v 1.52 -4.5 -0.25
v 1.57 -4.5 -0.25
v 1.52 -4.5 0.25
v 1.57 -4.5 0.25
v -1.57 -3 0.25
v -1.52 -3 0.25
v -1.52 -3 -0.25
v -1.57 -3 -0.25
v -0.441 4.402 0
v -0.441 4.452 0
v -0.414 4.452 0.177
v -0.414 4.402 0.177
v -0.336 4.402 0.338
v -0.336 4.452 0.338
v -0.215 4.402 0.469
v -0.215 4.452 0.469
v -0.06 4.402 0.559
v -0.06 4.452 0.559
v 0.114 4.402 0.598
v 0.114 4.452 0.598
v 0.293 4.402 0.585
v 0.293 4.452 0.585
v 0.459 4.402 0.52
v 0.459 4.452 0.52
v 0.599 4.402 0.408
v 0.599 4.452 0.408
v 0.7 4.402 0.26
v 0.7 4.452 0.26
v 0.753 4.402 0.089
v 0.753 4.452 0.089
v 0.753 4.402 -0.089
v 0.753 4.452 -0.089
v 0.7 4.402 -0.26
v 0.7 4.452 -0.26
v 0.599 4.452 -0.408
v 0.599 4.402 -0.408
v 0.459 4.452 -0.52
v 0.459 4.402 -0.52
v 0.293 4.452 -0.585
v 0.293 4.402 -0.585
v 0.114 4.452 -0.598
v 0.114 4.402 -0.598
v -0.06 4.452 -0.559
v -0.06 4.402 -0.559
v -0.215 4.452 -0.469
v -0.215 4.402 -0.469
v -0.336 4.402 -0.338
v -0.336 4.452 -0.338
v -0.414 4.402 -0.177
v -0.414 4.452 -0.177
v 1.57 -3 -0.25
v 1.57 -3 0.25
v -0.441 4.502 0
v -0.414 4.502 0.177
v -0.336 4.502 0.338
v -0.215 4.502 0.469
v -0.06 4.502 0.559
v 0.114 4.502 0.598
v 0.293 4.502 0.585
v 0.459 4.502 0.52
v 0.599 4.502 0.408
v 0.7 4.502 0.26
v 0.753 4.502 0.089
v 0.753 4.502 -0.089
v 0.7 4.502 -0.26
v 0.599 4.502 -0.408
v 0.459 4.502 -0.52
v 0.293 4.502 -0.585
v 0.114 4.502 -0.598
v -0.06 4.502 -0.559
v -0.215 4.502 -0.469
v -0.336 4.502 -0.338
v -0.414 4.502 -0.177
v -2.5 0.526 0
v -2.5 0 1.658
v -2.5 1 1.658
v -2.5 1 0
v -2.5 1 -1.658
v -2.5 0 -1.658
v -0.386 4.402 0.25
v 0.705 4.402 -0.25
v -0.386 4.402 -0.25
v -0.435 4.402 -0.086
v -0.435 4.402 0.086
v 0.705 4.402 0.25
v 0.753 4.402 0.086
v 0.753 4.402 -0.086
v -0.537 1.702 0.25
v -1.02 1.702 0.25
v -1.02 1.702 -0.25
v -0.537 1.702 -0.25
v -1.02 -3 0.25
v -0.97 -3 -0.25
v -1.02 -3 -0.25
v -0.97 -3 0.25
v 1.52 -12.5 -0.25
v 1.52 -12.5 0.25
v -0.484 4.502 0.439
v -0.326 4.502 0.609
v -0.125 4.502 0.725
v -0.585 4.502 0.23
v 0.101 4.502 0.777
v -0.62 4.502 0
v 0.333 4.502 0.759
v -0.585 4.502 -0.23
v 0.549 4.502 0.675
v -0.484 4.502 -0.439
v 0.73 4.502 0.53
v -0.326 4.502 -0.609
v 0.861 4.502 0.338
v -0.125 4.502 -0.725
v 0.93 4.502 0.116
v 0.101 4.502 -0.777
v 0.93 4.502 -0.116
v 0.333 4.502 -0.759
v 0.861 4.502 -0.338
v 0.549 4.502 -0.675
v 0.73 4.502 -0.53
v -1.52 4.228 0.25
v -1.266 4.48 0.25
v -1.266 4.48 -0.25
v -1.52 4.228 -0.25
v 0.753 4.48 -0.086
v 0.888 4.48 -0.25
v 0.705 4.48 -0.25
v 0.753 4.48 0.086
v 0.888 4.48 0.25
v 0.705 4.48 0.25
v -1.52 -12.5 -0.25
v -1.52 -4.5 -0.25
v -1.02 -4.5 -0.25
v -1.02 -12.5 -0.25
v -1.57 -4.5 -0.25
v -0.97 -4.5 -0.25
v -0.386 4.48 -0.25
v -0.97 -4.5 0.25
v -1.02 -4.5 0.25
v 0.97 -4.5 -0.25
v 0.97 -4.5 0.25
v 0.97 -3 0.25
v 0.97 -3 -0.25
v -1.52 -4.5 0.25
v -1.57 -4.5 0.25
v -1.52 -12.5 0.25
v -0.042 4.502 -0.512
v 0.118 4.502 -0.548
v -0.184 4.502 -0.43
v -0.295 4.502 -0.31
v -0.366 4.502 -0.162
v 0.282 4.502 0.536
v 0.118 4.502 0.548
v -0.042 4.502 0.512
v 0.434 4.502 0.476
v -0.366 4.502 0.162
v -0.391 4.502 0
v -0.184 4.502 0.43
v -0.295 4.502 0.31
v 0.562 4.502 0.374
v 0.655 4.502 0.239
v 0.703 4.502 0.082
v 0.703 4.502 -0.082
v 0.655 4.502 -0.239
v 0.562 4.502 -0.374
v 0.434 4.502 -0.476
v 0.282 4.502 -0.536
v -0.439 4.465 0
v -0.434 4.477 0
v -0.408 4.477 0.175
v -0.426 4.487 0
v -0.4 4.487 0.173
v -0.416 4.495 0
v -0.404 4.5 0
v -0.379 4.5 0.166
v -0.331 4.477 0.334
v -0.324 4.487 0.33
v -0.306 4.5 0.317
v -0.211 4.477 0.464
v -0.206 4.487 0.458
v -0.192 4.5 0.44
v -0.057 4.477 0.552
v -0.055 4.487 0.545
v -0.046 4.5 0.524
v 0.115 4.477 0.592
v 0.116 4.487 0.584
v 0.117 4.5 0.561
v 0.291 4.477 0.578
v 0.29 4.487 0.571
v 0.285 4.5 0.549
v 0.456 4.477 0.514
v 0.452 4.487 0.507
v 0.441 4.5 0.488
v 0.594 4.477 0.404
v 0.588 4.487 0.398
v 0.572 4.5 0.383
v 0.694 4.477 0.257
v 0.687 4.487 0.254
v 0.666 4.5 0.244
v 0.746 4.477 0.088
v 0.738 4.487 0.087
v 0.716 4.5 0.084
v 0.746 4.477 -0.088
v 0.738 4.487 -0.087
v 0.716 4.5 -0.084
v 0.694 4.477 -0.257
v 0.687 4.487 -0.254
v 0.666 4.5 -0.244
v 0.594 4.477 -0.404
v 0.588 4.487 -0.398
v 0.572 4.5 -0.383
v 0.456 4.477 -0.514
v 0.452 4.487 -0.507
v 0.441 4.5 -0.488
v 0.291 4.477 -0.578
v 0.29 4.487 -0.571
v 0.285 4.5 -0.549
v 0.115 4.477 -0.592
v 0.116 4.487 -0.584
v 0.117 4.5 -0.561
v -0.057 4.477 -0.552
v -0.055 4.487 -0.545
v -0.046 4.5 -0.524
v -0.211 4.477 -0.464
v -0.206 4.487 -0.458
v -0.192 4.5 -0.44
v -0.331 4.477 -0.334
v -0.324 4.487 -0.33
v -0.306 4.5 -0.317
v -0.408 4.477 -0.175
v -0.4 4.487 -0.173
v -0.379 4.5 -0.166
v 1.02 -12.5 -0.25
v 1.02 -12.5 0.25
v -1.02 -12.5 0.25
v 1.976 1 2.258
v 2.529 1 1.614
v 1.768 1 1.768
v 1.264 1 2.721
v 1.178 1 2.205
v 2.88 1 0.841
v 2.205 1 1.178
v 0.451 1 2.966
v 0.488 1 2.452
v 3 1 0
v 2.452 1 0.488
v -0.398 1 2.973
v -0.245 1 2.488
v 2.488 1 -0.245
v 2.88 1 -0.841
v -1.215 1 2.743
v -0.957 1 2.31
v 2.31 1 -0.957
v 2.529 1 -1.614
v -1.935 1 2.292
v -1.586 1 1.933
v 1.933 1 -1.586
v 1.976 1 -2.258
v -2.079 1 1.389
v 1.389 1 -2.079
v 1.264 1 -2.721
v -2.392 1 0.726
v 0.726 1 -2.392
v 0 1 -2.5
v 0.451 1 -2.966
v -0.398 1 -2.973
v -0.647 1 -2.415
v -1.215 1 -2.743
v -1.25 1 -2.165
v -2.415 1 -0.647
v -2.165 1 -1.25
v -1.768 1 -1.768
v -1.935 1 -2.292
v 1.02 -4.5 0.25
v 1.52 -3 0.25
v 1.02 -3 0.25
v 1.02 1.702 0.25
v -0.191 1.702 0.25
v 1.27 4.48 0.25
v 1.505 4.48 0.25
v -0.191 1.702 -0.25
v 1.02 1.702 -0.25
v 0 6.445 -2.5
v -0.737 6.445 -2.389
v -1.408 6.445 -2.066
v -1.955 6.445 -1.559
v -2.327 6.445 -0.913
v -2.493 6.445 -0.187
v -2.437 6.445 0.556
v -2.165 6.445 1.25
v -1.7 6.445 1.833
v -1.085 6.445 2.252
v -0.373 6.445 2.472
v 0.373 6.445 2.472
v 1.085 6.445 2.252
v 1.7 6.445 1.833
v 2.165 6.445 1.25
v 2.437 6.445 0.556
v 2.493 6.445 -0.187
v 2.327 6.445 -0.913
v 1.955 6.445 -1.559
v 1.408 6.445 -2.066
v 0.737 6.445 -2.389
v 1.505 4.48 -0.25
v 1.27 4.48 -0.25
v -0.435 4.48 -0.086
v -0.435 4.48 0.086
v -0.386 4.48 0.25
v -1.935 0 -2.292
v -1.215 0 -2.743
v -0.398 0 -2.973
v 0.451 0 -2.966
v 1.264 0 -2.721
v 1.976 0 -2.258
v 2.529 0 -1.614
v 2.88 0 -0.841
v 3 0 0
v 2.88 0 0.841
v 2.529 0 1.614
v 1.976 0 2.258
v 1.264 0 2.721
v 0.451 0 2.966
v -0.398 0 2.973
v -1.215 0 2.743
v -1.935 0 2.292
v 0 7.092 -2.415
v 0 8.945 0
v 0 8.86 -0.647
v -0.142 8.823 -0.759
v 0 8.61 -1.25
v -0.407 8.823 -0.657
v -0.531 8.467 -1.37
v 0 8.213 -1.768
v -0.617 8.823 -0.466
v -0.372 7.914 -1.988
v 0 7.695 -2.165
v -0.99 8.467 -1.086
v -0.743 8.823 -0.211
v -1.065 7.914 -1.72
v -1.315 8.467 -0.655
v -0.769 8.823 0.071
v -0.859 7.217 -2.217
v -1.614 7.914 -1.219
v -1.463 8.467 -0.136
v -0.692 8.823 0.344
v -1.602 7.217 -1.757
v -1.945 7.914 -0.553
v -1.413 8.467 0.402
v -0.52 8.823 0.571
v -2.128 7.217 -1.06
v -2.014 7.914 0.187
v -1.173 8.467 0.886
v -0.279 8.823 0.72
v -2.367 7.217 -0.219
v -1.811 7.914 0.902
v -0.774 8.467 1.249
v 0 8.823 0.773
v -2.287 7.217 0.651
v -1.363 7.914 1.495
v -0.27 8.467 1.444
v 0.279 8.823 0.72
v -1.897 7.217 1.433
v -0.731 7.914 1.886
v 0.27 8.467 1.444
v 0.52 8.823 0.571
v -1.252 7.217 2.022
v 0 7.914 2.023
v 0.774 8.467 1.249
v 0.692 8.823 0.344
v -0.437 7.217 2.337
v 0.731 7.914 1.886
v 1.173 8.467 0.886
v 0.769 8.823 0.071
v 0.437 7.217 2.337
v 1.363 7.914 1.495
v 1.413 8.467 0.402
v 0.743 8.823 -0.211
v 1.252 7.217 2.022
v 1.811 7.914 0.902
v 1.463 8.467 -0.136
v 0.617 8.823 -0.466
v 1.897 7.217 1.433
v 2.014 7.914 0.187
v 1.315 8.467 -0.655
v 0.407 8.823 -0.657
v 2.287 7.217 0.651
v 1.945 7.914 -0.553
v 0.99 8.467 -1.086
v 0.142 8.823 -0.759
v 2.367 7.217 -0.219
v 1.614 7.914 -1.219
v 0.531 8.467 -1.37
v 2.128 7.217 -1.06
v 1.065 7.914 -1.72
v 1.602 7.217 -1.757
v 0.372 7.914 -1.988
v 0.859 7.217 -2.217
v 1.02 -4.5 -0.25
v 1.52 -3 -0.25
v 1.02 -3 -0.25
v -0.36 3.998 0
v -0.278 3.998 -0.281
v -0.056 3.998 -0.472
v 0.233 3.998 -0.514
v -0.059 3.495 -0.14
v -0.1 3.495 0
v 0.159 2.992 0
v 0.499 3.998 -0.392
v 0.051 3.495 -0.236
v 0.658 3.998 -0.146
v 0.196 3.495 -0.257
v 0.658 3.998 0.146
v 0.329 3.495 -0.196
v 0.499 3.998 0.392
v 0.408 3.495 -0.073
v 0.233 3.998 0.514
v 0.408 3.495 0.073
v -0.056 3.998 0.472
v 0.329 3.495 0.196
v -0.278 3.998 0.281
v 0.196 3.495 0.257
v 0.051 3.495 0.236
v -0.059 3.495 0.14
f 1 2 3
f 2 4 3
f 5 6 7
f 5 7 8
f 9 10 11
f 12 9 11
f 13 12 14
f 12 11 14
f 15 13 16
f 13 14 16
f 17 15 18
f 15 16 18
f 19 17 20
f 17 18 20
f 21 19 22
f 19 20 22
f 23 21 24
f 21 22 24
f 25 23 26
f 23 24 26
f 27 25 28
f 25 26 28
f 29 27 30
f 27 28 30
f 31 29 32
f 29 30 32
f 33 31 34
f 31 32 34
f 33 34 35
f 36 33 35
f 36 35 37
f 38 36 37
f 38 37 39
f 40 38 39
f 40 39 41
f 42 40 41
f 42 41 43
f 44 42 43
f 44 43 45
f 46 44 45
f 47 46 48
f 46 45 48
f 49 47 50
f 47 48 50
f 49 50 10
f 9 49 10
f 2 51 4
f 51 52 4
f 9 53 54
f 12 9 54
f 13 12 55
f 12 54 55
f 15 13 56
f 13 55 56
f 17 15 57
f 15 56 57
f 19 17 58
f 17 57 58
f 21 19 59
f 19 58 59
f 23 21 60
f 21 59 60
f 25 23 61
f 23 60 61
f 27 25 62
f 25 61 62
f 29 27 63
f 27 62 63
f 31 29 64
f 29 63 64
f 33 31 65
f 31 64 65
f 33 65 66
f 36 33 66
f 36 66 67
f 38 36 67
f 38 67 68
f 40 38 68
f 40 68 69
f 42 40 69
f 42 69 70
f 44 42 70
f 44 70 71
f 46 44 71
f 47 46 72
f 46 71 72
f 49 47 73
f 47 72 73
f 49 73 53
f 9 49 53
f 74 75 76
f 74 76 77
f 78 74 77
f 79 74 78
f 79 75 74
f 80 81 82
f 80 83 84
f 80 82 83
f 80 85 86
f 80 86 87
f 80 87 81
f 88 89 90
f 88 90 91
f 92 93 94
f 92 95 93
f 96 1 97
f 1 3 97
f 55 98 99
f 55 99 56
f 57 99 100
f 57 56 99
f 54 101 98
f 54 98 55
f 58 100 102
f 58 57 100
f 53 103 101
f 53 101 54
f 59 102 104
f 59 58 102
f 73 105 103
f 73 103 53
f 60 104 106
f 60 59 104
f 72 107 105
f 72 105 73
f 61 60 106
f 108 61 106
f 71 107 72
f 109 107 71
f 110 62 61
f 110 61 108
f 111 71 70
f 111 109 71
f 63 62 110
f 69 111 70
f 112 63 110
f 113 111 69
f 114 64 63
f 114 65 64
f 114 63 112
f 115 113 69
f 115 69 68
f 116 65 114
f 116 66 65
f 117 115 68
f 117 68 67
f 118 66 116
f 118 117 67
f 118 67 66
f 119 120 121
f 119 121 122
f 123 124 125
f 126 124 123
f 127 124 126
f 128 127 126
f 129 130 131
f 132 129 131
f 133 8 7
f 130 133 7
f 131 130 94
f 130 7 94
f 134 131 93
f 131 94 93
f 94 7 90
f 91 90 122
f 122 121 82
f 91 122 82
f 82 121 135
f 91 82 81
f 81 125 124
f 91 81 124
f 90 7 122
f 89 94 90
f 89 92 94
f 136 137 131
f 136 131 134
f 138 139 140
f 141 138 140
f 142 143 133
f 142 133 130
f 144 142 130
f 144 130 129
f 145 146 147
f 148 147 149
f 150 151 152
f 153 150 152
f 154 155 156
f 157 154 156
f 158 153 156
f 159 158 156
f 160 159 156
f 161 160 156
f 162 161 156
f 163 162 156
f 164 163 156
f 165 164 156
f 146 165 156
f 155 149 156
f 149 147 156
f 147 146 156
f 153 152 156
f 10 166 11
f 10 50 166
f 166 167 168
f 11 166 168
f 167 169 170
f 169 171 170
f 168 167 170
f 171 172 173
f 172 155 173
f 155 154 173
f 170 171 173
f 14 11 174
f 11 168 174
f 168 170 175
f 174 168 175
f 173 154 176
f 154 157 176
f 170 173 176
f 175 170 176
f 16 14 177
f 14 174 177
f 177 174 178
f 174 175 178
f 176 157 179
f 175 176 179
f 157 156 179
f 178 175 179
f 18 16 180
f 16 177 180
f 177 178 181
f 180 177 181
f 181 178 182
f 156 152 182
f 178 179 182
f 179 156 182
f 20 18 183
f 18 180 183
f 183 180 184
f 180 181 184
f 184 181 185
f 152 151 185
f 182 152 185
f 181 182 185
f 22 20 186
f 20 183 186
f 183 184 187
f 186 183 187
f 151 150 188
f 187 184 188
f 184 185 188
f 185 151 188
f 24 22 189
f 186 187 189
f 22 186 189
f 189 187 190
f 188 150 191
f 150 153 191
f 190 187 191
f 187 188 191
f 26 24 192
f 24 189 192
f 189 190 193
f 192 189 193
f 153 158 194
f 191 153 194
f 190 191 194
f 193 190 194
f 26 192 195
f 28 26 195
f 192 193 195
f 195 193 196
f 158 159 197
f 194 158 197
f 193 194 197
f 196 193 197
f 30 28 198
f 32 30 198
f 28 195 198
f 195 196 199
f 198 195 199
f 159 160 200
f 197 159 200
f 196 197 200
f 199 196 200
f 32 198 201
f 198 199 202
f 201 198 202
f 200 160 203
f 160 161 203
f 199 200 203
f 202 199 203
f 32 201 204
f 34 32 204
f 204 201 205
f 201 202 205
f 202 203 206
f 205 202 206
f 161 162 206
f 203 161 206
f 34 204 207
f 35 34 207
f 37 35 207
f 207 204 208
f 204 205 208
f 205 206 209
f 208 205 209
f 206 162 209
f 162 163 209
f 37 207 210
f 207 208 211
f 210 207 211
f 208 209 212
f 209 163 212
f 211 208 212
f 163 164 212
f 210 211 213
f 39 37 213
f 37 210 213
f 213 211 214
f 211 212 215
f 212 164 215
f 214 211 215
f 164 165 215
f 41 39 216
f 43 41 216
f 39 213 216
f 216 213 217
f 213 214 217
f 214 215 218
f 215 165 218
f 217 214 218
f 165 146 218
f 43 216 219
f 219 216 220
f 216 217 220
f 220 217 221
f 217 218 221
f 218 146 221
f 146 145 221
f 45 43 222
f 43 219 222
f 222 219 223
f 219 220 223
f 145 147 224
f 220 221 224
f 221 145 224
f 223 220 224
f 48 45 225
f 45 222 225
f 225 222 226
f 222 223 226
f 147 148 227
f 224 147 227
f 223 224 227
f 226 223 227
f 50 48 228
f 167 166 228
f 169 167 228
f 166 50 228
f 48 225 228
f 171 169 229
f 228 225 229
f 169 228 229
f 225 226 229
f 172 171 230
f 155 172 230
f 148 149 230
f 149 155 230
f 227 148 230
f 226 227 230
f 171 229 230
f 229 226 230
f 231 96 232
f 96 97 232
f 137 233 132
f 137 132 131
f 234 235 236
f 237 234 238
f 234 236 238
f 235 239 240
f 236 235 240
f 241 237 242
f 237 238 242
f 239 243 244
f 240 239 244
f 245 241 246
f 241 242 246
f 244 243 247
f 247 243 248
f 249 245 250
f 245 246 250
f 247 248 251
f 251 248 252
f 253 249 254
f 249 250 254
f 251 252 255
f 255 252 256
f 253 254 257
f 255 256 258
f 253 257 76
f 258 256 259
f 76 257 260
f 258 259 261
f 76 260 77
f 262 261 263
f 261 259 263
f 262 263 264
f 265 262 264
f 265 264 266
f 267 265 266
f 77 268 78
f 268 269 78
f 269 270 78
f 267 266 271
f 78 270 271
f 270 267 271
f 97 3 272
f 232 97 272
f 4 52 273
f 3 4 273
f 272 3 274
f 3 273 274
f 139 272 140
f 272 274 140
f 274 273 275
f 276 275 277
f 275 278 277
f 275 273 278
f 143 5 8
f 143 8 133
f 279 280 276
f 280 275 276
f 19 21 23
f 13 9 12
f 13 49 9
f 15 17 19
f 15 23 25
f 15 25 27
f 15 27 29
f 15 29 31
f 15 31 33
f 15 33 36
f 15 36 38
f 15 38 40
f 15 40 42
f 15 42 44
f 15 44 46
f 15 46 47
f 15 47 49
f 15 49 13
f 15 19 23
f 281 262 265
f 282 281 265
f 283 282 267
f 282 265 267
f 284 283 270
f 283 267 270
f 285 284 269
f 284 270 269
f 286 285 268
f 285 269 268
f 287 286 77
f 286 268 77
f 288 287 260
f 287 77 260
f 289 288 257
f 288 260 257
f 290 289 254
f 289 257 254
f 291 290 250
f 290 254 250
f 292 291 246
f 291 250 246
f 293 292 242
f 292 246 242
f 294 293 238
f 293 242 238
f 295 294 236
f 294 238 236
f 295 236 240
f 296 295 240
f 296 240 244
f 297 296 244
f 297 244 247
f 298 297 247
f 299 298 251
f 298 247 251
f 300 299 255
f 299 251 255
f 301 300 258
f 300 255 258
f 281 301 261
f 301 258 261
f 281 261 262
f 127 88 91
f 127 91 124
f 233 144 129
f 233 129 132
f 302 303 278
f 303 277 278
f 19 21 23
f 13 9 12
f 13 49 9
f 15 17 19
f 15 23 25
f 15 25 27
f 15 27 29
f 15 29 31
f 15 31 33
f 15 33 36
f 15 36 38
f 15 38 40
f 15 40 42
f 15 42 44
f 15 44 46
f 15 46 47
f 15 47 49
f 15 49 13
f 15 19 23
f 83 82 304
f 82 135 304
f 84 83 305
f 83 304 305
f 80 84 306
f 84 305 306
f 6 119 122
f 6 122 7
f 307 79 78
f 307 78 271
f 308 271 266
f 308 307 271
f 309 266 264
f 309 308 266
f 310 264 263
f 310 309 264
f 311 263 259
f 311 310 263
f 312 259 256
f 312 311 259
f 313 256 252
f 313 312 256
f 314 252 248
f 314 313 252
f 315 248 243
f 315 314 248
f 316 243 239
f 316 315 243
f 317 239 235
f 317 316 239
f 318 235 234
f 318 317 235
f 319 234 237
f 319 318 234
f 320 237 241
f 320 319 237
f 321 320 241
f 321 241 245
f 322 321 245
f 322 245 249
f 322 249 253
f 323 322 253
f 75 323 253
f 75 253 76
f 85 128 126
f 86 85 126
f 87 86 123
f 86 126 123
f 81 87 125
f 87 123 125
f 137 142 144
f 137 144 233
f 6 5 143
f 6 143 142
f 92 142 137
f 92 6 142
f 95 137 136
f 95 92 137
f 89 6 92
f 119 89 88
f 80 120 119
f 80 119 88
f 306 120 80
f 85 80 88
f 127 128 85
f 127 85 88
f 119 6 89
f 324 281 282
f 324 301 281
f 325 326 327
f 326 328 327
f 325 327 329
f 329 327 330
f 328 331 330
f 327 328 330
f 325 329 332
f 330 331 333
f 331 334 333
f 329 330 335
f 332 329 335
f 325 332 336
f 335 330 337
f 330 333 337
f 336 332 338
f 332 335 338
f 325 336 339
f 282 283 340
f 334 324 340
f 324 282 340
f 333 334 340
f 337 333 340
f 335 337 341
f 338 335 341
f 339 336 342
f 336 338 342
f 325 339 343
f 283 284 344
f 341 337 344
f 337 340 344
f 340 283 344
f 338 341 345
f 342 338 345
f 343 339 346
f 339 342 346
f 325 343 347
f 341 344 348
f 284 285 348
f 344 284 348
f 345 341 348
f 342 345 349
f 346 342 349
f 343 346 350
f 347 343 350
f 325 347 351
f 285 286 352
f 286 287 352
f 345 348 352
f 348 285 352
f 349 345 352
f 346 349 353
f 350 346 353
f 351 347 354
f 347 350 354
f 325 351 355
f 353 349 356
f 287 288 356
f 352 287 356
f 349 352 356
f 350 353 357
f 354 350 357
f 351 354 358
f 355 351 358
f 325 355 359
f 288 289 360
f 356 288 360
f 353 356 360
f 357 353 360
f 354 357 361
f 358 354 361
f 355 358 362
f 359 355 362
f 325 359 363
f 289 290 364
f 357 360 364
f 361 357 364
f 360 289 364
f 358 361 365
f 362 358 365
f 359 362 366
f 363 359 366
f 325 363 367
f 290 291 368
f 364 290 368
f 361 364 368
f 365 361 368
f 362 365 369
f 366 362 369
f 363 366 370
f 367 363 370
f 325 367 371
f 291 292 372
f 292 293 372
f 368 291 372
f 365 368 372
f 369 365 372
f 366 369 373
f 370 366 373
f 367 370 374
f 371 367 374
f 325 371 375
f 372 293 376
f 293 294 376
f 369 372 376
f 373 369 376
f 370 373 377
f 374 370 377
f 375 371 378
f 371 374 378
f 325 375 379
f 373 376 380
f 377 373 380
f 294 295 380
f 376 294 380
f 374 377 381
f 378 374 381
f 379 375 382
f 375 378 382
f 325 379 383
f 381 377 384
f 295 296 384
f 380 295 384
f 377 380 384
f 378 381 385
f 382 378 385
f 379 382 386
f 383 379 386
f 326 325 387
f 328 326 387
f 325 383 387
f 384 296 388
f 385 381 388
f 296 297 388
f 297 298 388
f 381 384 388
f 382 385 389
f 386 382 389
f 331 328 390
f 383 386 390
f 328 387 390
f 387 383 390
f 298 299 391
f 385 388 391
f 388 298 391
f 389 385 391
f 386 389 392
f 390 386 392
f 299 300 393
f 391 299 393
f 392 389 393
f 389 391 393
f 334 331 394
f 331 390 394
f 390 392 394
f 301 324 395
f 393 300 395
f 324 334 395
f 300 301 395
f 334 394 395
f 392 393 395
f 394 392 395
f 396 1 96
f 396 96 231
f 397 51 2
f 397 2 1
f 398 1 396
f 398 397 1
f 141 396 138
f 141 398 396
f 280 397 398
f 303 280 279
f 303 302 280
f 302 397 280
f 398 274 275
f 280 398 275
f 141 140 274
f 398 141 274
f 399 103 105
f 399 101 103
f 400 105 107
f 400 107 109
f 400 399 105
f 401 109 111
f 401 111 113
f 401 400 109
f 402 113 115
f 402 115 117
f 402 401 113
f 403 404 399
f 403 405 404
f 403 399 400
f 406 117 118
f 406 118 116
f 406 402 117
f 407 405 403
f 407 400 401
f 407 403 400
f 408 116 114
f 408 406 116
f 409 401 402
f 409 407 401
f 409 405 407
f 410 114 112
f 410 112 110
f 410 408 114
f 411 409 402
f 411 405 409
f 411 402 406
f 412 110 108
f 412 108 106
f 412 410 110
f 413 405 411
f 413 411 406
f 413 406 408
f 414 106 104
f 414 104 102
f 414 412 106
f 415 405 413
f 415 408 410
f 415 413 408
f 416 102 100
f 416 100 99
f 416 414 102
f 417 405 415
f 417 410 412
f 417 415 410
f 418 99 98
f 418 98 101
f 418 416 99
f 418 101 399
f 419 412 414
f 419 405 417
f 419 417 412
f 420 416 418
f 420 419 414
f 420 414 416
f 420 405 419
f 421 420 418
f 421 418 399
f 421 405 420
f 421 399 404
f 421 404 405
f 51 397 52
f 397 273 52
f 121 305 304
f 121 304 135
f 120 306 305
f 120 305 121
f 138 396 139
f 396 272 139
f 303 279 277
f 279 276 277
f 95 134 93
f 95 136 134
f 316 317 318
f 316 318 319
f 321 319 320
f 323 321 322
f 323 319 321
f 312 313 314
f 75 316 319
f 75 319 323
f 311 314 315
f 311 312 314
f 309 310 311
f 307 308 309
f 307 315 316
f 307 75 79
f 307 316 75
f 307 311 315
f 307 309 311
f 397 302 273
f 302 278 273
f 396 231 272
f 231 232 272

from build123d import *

# Parameters (mm, degrees)
BOSS_EXTRUDE1_DEPTH   = 1
BOSS_EXTRUDE2_DEPTH   = 0.25
BOSS_EXTRUDE2_2_DEPTH = 0.25
SKETCH9_R             = 0.6
CUT_EXTRUDE1_DEPTH    = 0.1
FILLET1_R             = 0.05


with BuildPart() as part:
    # Sketch1 → Boss-Extrude1 (new body)
    with BuildSketch(Plane(origin=(0, 0, 0), x_dir=(1, 0, 0), z_dir=(0, 1, 0))):
        with BuildLine():
            Line((-2.5, 0), (-2.5, 1.658312395))
            ThreePointArc((-2.5, 1.658312395), (3, 0), (-2.5, -1.658312395))
            Line((-2.5, -1.658312395), (-2.5, 0))
        make_face()
    extrude(amount=BOSS_EXTRUDE1_DEPTH)

    # Sketch3 → Revolve1 (revolve)
    with BuildSketch(Plane(origin=(0, 0, 0), x_dir=(0, 0, -1), z_dir=(1, 0, 0)), mode=Mode.PRIVATE) as revolve1_sk:
        with BuildLine():
            Line((0, 0.52609168), (0, 8.944899703))
            ThreePointArc((0, 8.944899703), (-1.767766953, 8.212666656), (-2.5, 6.444899703))
            Line((-2.5, 6.444899703), (-2.5, 0.52609168))
            Line((-2.5, 0.52609168), (0, 0.52609168))
        make_face()
    revolve(revolve1_sk.sketch.rotate(Axis((0, 0.52609168, 0), (0, 1, 0)), 180), axis=Axis((0, 0.52609168, 0), (0, 1, 0)))


with BuildPart() as body_2:
    # Sketch4 → Boss-Extrude2 (new, symmetric)
    with BuildSketch(Plane.XY):
        Polygon((-1.02, -3), (-1.02, 1.701510316), (-0.536851564, 1.701510316), (0.887769977, 4.479591393), (-1.265672404, 4.479591393), (-1.52, 4.227964623), (-1.52, -3), (-1.57, -3), (-1.57, -4.5), (-1.52, -4.5), (-1.52, -12.5), (-1.02, -12.5), (-1.02, -4.5), (-0.97, -4.5), (-0.97, -3), align=None)
    extrude(amount=BOSS_EXTRUDE2_DEPTH, both=True)


with BuildPart() as body_3:
    # Sketch4 → Boss-Extrude2 2 (new, symmetric)
    with BuildSketch(Plane.XY):
        Polygon((1.02, -3), (1.02, 1.701510316), (-0.191450203, 1.701510316), (1.27, 4.479591393), (1.504865449, 4.479591393), (1.52, -3), (1.57, -3), (1.57, -4.5), (1.52, -4.5), (1.52, -12.5), (1.02, -12.5), (1.02, -4.5), (0.97, -4.5), (0.97, -3), align=None)
    extrude(amount=BOSS_EXTRUDE2_2_DEPTH, both=True)


with BuildPart() as body_4:
    # Sketch6 → Revolve2 (revolve)
    with BuildSketch(Plane.XY, mode=Mode.PRIVATE) as revolve2_sk:
        Polygon((0.159275367, 4.501838224), (0.93823214, 4.501838224), (0.159275367, 2.991525598), align=None)
    revolve(revolve2_sk.sketch.rotate(Axis((0.159275367, 6.166765255, 0), (0, -1, 0)), 180), axis=Axis((0.159275367, 6.166765255, 0), (0, -1, 0)))


with BuildPart() as cut_extrude1_tool:
    # Sketch9 → Cut-Extrude1 (new body)
    with BuildSketch(Plane(origin=(0, 4.501838224, 0), x_dir=(1, 0, 0), z_dir=(0, 1, 0))):
        with Locations(Location((0.159275367, 0, 0), (0, 0, 180))):
            Circle(SKETCH9_R)
    extrude(amount=-CUT_EXTRUDE1_DEPTH)


with BuildPart() as part_1:
    add(part.part)

    # Cut-Extrude1: cut by cut_extrude1_tool
    add(cut_extrude1_tool.part, mode=Mode.SUBTRACT)

    # Fillet1
    fillet1_edges = [part_1.edges().sort_by_distance(p)[0] for p in [
        (0.759275367, 4.501838224, 0),
    ]]
    fillet(fillet1_edges, radius=FILLET1_R)


with BuildPart() as body_2_1:
    add(body_2.part)

    # Cut-Extrude1: cut by cut_extrude1_tool
    add(cut_extrude1_tool.part, mode=Mode.SUBTRACT)


with BuildPart() as body_4_1:
    add(body_4.part)

    # Cut-Extrude1: cut by cut_extrude1_tool
    add(cut_extrude1_tool.part, mode=Mode.SUBTRACT)


solid = Compound([body_3.part, part_1.part, body_2_1.part, body_4_1.part])
